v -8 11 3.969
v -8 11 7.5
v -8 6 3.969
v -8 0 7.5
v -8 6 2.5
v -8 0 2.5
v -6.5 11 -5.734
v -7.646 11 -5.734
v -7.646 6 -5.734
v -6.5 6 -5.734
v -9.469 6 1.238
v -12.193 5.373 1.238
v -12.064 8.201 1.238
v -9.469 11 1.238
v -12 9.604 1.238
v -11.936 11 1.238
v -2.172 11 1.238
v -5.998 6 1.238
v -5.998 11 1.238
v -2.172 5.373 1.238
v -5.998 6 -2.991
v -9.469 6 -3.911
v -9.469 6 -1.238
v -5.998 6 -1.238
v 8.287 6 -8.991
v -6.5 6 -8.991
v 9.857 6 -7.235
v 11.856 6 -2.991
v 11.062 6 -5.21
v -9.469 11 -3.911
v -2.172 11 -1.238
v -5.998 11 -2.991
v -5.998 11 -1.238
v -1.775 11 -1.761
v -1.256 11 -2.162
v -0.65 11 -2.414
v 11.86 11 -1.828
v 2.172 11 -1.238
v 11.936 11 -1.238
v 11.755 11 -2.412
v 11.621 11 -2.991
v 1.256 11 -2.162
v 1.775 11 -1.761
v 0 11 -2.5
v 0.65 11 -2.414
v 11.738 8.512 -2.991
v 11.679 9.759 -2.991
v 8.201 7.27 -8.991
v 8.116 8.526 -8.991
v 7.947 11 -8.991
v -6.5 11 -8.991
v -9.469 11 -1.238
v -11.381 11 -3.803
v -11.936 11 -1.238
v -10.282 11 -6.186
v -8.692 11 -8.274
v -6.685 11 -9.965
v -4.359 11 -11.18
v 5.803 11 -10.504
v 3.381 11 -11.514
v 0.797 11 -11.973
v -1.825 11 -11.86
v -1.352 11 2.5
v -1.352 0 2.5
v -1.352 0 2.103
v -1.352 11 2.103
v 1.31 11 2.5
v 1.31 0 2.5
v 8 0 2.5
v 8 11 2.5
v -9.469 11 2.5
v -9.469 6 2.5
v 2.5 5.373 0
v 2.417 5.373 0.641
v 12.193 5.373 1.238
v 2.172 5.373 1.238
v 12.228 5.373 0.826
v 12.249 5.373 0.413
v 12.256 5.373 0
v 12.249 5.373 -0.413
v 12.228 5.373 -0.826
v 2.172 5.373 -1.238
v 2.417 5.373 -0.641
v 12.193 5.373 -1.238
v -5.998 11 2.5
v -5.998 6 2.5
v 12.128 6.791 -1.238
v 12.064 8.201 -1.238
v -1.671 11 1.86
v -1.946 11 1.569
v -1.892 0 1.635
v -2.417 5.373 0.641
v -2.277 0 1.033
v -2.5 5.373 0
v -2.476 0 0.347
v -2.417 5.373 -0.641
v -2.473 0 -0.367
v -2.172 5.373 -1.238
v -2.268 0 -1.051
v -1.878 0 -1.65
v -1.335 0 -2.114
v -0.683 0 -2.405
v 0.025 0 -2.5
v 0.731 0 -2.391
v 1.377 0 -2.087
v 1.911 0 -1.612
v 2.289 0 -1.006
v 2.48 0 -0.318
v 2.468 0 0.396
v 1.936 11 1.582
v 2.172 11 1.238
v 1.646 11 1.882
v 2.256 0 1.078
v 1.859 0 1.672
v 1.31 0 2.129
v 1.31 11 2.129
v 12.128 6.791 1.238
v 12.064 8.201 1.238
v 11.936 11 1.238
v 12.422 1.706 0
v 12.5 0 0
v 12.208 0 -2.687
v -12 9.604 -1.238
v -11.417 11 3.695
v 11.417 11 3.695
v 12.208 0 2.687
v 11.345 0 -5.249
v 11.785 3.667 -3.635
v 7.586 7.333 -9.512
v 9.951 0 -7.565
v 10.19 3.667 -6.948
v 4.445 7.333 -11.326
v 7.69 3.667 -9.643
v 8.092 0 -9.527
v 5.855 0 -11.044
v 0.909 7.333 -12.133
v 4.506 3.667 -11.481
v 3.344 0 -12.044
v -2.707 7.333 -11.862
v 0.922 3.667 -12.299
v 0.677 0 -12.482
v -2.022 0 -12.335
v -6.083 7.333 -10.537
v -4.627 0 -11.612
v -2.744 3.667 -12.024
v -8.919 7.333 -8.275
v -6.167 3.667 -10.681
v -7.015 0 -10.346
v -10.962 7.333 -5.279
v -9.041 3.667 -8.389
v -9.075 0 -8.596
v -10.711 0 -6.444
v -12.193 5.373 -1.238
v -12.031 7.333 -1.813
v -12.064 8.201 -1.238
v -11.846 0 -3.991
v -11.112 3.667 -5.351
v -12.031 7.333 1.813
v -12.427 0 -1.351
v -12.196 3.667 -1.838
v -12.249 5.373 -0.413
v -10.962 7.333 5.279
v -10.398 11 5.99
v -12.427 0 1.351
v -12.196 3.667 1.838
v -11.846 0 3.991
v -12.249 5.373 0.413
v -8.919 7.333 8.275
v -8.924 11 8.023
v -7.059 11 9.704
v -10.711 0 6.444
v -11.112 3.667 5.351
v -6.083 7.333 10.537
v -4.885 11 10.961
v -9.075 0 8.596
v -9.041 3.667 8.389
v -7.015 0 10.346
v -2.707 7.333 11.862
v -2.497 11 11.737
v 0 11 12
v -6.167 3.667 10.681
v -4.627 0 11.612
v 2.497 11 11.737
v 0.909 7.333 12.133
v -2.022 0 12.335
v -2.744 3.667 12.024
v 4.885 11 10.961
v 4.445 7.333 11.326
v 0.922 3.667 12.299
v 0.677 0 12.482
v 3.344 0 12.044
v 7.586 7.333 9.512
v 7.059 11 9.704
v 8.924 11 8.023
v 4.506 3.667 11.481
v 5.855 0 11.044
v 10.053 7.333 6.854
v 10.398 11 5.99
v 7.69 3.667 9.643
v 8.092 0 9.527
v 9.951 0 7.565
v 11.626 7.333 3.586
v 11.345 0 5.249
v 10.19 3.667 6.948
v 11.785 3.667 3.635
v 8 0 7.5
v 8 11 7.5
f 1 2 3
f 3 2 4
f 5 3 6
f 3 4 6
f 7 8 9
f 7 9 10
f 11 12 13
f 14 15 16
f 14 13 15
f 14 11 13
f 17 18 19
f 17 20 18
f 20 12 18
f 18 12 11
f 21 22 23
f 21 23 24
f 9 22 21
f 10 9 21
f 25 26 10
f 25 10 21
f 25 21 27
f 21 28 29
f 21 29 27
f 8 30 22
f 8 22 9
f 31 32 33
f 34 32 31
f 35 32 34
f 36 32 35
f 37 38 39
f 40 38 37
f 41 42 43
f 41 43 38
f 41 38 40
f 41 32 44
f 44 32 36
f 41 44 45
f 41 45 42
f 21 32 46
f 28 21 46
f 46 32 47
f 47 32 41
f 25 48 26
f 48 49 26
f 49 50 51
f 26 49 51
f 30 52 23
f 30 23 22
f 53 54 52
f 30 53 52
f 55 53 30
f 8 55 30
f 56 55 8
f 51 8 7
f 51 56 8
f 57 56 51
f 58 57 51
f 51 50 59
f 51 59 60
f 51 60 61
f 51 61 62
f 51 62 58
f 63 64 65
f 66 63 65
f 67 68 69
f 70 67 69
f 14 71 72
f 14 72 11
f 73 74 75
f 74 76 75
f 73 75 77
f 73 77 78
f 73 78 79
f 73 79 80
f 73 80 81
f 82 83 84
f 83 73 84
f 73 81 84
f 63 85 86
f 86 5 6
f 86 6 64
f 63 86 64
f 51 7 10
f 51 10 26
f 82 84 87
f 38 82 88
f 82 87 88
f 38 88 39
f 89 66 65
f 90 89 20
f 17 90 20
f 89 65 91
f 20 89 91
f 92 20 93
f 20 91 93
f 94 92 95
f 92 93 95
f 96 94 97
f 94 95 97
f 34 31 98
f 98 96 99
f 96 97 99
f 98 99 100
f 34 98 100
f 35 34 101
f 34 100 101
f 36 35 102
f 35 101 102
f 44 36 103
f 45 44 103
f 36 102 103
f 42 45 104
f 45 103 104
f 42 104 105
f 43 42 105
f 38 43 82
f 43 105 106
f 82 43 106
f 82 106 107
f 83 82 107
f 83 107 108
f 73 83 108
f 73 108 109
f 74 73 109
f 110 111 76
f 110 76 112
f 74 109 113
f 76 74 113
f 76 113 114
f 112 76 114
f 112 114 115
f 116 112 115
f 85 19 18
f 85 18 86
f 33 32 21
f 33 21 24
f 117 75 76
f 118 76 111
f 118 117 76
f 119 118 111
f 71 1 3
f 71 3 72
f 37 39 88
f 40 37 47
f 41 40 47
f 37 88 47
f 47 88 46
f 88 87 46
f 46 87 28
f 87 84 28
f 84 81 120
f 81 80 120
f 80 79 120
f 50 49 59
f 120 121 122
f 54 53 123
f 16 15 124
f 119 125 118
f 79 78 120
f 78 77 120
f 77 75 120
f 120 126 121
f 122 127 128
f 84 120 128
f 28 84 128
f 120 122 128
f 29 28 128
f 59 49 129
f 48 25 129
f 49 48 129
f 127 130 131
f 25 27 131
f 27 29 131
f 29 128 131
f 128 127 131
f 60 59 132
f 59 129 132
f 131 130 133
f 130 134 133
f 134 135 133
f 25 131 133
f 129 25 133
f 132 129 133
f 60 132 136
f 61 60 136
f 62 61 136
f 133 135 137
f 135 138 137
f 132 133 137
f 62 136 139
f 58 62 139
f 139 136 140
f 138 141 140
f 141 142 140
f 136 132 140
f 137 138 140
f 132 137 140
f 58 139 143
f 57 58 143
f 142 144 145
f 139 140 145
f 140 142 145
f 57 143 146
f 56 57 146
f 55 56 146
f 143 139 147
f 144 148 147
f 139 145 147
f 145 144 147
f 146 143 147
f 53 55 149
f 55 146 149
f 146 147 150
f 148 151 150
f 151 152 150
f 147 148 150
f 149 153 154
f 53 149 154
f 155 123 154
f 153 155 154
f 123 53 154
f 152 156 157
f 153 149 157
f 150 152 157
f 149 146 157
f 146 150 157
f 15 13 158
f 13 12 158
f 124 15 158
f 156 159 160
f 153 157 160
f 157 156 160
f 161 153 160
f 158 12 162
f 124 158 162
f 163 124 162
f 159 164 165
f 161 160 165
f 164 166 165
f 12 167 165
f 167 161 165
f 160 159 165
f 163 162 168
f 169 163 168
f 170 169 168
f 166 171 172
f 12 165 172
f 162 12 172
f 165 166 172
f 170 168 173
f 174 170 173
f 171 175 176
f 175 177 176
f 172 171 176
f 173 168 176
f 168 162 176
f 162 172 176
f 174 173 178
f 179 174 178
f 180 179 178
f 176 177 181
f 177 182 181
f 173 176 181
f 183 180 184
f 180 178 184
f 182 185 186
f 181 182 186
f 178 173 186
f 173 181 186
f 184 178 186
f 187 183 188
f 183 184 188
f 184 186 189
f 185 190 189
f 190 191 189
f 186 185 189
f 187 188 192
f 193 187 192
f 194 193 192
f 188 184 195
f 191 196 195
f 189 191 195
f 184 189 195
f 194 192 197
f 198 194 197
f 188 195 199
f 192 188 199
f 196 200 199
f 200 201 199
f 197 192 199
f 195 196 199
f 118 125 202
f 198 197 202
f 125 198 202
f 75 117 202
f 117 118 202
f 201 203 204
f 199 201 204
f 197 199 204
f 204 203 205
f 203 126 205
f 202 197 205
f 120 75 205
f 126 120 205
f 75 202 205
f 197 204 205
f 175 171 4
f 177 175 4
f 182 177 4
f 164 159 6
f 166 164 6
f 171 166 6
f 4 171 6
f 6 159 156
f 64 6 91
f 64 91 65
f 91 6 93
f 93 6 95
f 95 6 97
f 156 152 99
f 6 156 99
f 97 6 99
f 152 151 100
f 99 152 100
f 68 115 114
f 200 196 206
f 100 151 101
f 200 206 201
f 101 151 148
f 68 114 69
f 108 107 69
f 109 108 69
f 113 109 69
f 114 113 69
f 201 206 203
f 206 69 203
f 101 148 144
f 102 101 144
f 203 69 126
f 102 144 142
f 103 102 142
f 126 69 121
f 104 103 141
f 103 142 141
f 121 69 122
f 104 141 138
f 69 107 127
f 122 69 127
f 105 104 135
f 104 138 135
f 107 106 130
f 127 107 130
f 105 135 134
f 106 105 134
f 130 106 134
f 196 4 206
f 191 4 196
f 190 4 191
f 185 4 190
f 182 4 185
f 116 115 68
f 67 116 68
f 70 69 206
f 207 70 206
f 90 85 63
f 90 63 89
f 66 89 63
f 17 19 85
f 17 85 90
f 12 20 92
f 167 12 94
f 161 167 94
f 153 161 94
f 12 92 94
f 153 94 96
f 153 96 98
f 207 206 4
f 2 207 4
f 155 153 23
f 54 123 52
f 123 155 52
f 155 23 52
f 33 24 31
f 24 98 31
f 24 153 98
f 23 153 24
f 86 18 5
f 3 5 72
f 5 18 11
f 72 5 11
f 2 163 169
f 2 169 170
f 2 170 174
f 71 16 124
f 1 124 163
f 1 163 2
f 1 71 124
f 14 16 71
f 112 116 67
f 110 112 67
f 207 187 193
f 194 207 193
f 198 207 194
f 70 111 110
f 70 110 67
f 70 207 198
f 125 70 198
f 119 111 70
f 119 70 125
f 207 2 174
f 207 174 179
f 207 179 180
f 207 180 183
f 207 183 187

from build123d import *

# Parameters (mm, degrees)
SKETCH_2_R          = 12
SKETCH_1_R          = 12.5
CUT_EXTRUDE_1_DEPTH = 12.0000001
SKETCH_5_W          = 13
SKETCH_5_H          = 6
CUT_EXTRUDE_2_DEPTH = 5
SKETCH_6_W          = 2.476692414
SKETCH_6_H          = 6.83521307
CUT_EXTRUDE_3_DEPTH = 20
CUT_EXTRUDE_4_DEPTH = 5


with BuildPart() as part:
    # 草图2 → 放样1 section 0
    with BuildSketch(Plane(origin=(0, 11, 0), x_dir=(1, 0, 0), z_dir=(0, 1, 0))):
        Circle(SKETCH_2_R)
    # 草图1 → 放样1 section 1
    with BuildSketch(Plane(origin=(0, 0, 0), x_dir=(1, 0, 0), z_dir=(0, 1, 0))):
        Circle(SKETCH_1_R)
    loft()

    # 草图4 → 切除-拉伸1 (cut, through all)
    with BuildSketch(Plane(origin=(0, 0, 0), x_dir=(1, 0, 0), z_dir=(0, 1, 0))):
        with BuildLine():
            Line((-1.352272566, -2.5), (-1.352272566, -2.102702762))
            ThreePointArc((-1.352272566, -2.102702762), (0.025010963, 2.499874887), (1.309931483, -2.12933781))
            Line((1.309931483, -2.12933781), (1.309931483, -2.5))
            Line((1.309931483, -2.5), (8, -2.5))
            Line((8, -2.5), (8, -7.5))
            Line((8, -7.5), (-8, -7.5))
            Line((-8, -7.5), (-8, -2.5))
            Line((-8, -2.5), (-1.352272566, -2.5))
        make_face()
    extrude(amount=CUT_EXTRUDE_1_DEPTH, mode=Mode.SUBTRACT)

    # 草图5 → 切除-拉伸2 (cut)
    with BuildSketch(Plane(origin=(0, 11, 0), x_dir=(1, 0, 0), z_dir=(0, 1, 0))):
        with Locations((0, 5.991032562)):
            Rectangle(SKETCH_5_W, SKETCH_5_H)
        with BuildLine():
            Line((7.947410488, 8.991032562), (6.5, 8.991032562))
            Line((6.5, 8.991032562), (6.5, 2.991032562))
            Line((6.5, 2.991032562), (11.621261731, 2.991032562))
            ThreePointArc((11.621261731, 2.991032562), (10.233925596, 6.266320045), (7.947410488, 8.991032562))
        make_face()
        with BuildLine():
            Line((15.348611284, 8.991032562), (7.947410488, 8.991032562))
            ThreePointArc((7.947410488, 8.991032562), (10.233925596, 6.266320045), (11.621261731, 2.991032562))
            Line((11.621261731, 2.991032562), (15.348611284, 2.991032562))
            Line((15.348611284, 2.991032562), (15.348611284, 8.991032562))
        make_face()
    extrude(amount=-CUT_EXTRUDE_2_DEPTH, mode=Mode.SUBTRACT)

    # 草图6 → 切除-拉伸3 (cut, symmetric)
    with BuildSketch(Plane(origin=(0, 0, 0), x_dir=(0, 0, -1), z_dir=(1, 0, 0))):
        with Locations((0, 8.790545757)):
            Rectangle(SKETCH_6_W, SKETCH_6_H)
    extrude(amount=CUT_EXTRUDE_3_DEPTH, both=True, mode=Mode.SUBTRACT)

    # 草图7 → 切除-拉伸4 (cut)
    with BuildSketch(Plane(origin=(0, 11, 0), x_dir=(1, 0, 0), z_dir=(0, 1, 0))):
        Polygon((-5.998196858, 2.991032562), (-5.998196858, -3.96939498), (-8, -3.96939498), (-9.46939498, -2.5), (-9.46939498, 3.910589128), (-7.645587141, 5.734396966), (-6.5, 5.734396966), align=None)
    extrude(amount=-CUT_EXTRUDE_4_DEPTH, mode=Mode.SUBTRACT)


solid = part.part
